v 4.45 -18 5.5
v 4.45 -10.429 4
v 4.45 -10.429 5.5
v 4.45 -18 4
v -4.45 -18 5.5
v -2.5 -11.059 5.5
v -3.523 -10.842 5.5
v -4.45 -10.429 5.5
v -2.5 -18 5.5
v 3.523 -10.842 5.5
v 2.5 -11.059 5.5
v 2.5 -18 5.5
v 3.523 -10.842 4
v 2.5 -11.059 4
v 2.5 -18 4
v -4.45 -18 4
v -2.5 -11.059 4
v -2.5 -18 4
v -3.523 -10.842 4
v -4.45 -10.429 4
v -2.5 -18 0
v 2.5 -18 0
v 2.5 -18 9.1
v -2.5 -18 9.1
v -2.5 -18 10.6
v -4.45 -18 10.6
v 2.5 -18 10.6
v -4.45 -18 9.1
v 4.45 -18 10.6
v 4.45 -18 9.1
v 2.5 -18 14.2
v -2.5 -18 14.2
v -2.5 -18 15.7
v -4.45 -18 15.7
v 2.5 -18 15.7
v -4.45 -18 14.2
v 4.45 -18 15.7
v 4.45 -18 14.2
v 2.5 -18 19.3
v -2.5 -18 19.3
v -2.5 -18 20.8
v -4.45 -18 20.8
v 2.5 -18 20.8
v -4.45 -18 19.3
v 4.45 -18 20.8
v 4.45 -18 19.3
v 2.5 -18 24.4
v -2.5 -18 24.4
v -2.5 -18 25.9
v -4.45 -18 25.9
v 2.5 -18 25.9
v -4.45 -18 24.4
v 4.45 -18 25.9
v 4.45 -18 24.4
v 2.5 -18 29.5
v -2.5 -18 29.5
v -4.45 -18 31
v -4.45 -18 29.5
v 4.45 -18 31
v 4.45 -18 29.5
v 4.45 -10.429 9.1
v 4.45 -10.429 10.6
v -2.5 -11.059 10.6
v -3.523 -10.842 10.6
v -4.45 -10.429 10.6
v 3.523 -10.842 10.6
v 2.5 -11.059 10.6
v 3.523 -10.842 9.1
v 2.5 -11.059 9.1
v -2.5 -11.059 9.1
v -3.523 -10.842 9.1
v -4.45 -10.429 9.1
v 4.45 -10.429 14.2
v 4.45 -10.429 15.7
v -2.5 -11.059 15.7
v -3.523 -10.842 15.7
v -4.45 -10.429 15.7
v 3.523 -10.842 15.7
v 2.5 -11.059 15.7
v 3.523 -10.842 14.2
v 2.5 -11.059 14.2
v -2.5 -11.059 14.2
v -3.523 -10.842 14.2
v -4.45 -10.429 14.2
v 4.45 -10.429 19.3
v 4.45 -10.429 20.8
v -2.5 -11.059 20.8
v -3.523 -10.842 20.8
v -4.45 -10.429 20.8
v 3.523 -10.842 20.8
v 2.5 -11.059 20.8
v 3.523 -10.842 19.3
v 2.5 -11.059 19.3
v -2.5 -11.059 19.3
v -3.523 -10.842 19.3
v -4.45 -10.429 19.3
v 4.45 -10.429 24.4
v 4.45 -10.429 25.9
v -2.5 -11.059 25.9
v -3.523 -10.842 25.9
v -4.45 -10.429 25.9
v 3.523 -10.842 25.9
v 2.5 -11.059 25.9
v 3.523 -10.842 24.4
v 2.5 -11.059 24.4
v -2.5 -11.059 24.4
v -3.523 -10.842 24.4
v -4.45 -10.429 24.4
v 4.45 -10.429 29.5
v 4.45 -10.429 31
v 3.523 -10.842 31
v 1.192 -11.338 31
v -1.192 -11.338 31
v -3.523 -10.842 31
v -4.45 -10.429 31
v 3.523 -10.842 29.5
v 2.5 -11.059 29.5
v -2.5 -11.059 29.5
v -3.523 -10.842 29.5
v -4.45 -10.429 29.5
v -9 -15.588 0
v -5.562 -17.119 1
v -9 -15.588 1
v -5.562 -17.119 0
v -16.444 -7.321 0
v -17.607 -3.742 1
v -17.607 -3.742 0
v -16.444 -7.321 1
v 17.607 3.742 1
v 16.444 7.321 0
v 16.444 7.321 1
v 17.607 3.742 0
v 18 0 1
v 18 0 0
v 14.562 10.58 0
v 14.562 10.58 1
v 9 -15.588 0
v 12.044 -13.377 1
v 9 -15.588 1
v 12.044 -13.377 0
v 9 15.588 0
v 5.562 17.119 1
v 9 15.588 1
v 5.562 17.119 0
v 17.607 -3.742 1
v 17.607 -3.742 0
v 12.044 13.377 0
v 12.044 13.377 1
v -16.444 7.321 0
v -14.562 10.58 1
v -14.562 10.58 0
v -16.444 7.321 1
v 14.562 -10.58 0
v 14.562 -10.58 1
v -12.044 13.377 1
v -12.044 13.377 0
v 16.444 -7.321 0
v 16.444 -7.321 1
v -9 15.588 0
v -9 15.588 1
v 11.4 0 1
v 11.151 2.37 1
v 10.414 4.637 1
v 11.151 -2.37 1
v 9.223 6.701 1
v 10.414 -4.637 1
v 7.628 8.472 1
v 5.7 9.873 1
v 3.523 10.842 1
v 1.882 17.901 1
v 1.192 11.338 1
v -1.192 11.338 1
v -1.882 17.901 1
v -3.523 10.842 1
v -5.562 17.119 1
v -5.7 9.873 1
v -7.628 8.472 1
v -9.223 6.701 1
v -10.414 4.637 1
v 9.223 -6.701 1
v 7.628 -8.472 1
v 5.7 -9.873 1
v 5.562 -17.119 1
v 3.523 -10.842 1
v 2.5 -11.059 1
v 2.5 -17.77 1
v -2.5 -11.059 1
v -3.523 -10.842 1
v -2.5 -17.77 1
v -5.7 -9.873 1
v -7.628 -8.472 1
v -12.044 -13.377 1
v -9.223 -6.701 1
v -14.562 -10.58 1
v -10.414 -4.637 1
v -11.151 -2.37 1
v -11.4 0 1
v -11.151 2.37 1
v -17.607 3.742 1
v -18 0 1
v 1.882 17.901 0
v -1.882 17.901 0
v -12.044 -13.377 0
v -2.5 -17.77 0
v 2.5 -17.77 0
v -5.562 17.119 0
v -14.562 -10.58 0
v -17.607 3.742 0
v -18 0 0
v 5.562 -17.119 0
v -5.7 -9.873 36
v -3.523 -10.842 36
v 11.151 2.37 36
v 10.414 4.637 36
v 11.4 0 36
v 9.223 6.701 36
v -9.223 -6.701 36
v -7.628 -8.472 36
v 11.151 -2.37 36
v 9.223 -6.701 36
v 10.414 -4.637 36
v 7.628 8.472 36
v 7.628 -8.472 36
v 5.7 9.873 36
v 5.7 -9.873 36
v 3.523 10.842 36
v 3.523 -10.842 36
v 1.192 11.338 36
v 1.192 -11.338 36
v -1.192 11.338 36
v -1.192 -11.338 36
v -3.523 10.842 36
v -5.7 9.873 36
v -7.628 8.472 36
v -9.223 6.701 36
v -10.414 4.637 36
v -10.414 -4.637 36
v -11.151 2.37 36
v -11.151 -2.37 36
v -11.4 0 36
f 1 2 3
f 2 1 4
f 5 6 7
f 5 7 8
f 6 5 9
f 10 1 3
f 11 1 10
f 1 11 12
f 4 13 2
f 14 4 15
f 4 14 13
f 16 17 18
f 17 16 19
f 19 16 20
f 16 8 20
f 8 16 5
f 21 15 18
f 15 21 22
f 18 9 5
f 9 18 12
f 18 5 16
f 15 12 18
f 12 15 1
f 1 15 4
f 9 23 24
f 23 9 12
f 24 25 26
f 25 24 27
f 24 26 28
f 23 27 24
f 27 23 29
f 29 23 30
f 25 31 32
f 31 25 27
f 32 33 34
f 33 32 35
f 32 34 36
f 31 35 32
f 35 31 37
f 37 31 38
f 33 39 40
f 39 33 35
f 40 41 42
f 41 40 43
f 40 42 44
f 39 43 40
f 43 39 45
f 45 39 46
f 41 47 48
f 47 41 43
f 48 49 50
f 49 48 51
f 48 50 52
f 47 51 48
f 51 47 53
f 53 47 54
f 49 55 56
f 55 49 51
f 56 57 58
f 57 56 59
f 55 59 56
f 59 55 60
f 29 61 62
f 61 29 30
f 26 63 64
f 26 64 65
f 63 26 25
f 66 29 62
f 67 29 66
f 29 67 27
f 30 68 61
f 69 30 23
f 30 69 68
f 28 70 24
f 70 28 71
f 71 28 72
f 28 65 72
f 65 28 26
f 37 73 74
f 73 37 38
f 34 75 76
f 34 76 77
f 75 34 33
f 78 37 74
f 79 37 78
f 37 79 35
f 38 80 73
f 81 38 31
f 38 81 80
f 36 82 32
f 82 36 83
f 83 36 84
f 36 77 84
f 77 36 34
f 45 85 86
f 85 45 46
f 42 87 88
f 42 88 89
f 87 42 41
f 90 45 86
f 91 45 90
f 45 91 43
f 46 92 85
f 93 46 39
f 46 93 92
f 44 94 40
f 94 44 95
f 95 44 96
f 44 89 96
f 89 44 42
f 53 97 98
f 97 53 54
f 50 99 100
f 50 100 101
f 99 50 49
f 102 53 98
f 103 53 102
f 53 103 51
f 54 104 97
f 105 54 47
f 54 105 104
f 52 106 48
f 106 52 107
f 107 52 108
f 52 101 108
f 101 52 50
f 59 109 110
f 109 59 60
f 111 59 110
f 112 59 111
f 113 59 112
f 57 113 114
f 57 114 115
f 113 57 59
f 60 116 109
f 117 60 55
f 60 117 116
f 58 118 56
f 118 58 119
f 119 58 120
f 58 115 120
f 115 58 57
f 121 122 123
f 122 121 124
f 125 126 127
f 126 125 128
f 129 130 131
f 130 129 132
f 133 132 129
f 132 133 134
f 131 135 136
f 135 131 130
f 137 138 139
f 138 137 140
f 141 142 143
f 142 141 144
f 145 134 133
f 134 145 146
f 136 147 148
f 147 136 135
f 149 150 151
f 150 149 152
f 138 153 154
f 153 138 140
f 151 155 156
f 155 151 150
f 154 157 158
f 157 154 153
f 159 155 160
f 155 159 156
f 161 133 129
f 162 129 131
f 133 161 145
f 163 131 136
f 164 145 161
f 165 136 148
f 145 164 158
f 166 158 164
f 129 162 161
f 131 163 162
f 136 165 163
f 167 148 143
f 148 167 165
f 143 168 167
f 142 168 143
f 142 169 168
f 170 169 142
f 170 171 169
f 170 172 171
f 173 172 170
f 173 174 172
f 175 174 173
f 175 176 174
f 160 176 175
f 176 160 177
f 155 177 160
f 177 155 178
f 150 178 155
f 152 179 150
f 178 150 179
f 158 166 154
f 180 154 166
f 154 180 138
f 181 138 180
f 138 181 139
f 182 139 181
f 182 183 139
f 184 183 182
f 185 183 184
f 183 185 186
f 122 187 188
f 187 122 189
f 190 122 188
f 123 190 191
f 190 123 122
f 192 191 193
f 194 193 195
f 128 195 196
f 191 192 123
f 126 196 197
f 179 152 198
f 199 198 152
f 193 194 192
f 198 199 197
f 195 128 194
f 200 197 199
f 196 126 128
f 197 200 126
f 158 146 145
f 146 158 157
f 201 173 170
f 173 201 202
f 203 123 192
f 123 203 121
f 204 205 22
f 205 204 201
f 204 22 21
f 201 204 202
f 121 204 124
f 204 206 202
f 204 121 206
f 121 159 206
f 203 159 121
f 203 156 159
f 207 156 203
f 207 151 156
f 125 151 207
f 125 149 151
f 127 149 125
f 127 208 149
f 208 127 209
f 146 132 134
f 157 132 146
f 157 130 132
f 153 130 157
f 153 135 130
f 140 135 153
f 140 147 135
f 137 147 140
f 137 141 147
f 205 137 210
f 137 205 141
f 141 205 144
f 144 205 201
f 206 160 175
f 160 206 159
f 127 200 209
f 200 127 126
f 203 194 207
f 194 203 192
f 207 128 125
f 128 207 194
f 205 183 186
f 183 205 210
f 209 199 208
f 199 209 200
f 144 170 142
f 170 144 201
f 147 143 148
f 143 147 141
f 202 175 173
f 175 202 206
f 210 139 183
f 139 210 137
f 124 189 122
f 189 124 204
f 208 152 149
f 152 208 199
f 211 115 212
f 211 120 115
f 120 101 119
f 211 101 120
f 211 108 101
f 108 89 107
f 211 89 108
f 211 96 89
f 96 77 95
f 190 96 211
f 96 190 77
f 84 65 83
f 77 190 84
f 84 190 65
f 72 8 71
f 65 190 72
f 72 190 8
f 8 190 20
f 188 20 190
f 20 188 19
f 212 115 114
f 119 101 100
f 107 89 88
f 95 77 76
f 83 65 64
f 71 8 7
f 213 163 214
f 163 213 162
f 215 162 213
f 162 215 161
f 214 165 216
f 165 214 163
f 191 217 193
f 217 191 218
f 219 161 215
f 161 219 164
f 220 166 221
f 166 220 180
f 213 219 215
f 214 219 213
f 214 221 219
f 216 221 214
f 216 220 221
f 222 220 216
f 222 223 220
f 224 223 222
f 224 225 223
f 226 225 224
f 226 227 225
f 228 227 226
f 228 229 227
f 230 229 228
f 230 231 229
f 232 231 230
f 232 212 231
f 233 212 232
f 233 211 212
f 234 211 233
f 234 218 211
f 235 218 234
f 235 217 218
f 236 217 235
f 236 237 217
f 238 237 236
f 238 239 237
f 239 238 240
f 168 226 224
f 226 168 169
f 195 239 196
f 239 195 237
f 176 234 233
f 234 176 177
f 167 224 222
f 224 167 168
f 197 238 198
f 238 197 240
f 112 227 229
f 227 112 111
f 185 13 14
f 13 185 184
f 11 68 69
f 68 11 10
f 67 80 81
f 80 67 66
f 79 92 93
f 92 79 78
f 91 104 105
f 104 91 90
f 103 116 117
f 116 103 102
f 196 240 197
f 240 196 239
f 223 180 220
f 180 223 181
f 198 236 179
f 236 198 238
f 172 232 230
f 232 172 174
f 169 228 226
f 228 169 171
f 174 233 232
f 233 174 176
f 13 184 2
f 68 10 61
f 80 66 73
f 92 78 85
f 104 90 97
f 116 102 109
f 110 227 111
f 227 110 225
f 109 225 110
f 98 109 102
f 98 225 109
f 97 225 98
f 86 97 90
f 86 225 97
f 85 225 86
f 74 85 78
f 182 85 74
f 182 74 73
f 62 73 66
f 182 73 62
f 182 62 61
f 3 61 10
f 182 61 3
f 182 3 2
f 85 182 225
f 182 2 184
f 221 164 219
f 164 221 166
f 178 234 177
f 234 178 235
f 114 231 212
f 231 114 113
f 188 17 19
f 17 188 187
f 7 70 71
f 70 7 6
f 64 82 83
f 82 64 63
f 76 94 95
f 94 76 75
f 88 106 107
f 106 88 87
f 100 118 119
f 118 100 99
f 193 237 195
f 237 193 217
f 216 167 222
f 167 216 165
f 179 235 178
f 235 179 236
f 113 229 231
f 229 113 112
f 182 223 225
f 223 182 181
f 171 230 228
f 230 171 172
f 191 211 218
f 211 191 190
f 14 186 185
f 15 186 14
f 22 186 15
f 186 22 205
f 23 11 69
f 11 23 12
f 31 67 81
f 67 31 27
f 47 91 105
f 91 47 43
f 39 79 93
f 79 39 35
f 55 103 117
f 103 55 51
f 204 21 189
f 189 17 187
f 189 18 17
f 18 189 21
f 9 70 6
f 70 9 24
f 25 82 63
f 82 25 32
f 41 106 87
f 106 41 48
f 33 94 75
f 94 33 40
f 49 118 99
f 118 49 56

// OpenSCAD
// Test rig for Hinge cover for the Macintosh Portable
// Copyright François Revol, 2026




cylinder(d=36, h=1);
cylinder(d=22.8, h=32+4);
translate([0,-18/2,(27+4)/2]) cube([5, 18, 27+4], center=true);
for (dz=[0:5])
    translate([0,-18/2,1.5/2+(dz/5)*(27-1.5)+4]) cube([8.9, 18, 1.5], center=true);
